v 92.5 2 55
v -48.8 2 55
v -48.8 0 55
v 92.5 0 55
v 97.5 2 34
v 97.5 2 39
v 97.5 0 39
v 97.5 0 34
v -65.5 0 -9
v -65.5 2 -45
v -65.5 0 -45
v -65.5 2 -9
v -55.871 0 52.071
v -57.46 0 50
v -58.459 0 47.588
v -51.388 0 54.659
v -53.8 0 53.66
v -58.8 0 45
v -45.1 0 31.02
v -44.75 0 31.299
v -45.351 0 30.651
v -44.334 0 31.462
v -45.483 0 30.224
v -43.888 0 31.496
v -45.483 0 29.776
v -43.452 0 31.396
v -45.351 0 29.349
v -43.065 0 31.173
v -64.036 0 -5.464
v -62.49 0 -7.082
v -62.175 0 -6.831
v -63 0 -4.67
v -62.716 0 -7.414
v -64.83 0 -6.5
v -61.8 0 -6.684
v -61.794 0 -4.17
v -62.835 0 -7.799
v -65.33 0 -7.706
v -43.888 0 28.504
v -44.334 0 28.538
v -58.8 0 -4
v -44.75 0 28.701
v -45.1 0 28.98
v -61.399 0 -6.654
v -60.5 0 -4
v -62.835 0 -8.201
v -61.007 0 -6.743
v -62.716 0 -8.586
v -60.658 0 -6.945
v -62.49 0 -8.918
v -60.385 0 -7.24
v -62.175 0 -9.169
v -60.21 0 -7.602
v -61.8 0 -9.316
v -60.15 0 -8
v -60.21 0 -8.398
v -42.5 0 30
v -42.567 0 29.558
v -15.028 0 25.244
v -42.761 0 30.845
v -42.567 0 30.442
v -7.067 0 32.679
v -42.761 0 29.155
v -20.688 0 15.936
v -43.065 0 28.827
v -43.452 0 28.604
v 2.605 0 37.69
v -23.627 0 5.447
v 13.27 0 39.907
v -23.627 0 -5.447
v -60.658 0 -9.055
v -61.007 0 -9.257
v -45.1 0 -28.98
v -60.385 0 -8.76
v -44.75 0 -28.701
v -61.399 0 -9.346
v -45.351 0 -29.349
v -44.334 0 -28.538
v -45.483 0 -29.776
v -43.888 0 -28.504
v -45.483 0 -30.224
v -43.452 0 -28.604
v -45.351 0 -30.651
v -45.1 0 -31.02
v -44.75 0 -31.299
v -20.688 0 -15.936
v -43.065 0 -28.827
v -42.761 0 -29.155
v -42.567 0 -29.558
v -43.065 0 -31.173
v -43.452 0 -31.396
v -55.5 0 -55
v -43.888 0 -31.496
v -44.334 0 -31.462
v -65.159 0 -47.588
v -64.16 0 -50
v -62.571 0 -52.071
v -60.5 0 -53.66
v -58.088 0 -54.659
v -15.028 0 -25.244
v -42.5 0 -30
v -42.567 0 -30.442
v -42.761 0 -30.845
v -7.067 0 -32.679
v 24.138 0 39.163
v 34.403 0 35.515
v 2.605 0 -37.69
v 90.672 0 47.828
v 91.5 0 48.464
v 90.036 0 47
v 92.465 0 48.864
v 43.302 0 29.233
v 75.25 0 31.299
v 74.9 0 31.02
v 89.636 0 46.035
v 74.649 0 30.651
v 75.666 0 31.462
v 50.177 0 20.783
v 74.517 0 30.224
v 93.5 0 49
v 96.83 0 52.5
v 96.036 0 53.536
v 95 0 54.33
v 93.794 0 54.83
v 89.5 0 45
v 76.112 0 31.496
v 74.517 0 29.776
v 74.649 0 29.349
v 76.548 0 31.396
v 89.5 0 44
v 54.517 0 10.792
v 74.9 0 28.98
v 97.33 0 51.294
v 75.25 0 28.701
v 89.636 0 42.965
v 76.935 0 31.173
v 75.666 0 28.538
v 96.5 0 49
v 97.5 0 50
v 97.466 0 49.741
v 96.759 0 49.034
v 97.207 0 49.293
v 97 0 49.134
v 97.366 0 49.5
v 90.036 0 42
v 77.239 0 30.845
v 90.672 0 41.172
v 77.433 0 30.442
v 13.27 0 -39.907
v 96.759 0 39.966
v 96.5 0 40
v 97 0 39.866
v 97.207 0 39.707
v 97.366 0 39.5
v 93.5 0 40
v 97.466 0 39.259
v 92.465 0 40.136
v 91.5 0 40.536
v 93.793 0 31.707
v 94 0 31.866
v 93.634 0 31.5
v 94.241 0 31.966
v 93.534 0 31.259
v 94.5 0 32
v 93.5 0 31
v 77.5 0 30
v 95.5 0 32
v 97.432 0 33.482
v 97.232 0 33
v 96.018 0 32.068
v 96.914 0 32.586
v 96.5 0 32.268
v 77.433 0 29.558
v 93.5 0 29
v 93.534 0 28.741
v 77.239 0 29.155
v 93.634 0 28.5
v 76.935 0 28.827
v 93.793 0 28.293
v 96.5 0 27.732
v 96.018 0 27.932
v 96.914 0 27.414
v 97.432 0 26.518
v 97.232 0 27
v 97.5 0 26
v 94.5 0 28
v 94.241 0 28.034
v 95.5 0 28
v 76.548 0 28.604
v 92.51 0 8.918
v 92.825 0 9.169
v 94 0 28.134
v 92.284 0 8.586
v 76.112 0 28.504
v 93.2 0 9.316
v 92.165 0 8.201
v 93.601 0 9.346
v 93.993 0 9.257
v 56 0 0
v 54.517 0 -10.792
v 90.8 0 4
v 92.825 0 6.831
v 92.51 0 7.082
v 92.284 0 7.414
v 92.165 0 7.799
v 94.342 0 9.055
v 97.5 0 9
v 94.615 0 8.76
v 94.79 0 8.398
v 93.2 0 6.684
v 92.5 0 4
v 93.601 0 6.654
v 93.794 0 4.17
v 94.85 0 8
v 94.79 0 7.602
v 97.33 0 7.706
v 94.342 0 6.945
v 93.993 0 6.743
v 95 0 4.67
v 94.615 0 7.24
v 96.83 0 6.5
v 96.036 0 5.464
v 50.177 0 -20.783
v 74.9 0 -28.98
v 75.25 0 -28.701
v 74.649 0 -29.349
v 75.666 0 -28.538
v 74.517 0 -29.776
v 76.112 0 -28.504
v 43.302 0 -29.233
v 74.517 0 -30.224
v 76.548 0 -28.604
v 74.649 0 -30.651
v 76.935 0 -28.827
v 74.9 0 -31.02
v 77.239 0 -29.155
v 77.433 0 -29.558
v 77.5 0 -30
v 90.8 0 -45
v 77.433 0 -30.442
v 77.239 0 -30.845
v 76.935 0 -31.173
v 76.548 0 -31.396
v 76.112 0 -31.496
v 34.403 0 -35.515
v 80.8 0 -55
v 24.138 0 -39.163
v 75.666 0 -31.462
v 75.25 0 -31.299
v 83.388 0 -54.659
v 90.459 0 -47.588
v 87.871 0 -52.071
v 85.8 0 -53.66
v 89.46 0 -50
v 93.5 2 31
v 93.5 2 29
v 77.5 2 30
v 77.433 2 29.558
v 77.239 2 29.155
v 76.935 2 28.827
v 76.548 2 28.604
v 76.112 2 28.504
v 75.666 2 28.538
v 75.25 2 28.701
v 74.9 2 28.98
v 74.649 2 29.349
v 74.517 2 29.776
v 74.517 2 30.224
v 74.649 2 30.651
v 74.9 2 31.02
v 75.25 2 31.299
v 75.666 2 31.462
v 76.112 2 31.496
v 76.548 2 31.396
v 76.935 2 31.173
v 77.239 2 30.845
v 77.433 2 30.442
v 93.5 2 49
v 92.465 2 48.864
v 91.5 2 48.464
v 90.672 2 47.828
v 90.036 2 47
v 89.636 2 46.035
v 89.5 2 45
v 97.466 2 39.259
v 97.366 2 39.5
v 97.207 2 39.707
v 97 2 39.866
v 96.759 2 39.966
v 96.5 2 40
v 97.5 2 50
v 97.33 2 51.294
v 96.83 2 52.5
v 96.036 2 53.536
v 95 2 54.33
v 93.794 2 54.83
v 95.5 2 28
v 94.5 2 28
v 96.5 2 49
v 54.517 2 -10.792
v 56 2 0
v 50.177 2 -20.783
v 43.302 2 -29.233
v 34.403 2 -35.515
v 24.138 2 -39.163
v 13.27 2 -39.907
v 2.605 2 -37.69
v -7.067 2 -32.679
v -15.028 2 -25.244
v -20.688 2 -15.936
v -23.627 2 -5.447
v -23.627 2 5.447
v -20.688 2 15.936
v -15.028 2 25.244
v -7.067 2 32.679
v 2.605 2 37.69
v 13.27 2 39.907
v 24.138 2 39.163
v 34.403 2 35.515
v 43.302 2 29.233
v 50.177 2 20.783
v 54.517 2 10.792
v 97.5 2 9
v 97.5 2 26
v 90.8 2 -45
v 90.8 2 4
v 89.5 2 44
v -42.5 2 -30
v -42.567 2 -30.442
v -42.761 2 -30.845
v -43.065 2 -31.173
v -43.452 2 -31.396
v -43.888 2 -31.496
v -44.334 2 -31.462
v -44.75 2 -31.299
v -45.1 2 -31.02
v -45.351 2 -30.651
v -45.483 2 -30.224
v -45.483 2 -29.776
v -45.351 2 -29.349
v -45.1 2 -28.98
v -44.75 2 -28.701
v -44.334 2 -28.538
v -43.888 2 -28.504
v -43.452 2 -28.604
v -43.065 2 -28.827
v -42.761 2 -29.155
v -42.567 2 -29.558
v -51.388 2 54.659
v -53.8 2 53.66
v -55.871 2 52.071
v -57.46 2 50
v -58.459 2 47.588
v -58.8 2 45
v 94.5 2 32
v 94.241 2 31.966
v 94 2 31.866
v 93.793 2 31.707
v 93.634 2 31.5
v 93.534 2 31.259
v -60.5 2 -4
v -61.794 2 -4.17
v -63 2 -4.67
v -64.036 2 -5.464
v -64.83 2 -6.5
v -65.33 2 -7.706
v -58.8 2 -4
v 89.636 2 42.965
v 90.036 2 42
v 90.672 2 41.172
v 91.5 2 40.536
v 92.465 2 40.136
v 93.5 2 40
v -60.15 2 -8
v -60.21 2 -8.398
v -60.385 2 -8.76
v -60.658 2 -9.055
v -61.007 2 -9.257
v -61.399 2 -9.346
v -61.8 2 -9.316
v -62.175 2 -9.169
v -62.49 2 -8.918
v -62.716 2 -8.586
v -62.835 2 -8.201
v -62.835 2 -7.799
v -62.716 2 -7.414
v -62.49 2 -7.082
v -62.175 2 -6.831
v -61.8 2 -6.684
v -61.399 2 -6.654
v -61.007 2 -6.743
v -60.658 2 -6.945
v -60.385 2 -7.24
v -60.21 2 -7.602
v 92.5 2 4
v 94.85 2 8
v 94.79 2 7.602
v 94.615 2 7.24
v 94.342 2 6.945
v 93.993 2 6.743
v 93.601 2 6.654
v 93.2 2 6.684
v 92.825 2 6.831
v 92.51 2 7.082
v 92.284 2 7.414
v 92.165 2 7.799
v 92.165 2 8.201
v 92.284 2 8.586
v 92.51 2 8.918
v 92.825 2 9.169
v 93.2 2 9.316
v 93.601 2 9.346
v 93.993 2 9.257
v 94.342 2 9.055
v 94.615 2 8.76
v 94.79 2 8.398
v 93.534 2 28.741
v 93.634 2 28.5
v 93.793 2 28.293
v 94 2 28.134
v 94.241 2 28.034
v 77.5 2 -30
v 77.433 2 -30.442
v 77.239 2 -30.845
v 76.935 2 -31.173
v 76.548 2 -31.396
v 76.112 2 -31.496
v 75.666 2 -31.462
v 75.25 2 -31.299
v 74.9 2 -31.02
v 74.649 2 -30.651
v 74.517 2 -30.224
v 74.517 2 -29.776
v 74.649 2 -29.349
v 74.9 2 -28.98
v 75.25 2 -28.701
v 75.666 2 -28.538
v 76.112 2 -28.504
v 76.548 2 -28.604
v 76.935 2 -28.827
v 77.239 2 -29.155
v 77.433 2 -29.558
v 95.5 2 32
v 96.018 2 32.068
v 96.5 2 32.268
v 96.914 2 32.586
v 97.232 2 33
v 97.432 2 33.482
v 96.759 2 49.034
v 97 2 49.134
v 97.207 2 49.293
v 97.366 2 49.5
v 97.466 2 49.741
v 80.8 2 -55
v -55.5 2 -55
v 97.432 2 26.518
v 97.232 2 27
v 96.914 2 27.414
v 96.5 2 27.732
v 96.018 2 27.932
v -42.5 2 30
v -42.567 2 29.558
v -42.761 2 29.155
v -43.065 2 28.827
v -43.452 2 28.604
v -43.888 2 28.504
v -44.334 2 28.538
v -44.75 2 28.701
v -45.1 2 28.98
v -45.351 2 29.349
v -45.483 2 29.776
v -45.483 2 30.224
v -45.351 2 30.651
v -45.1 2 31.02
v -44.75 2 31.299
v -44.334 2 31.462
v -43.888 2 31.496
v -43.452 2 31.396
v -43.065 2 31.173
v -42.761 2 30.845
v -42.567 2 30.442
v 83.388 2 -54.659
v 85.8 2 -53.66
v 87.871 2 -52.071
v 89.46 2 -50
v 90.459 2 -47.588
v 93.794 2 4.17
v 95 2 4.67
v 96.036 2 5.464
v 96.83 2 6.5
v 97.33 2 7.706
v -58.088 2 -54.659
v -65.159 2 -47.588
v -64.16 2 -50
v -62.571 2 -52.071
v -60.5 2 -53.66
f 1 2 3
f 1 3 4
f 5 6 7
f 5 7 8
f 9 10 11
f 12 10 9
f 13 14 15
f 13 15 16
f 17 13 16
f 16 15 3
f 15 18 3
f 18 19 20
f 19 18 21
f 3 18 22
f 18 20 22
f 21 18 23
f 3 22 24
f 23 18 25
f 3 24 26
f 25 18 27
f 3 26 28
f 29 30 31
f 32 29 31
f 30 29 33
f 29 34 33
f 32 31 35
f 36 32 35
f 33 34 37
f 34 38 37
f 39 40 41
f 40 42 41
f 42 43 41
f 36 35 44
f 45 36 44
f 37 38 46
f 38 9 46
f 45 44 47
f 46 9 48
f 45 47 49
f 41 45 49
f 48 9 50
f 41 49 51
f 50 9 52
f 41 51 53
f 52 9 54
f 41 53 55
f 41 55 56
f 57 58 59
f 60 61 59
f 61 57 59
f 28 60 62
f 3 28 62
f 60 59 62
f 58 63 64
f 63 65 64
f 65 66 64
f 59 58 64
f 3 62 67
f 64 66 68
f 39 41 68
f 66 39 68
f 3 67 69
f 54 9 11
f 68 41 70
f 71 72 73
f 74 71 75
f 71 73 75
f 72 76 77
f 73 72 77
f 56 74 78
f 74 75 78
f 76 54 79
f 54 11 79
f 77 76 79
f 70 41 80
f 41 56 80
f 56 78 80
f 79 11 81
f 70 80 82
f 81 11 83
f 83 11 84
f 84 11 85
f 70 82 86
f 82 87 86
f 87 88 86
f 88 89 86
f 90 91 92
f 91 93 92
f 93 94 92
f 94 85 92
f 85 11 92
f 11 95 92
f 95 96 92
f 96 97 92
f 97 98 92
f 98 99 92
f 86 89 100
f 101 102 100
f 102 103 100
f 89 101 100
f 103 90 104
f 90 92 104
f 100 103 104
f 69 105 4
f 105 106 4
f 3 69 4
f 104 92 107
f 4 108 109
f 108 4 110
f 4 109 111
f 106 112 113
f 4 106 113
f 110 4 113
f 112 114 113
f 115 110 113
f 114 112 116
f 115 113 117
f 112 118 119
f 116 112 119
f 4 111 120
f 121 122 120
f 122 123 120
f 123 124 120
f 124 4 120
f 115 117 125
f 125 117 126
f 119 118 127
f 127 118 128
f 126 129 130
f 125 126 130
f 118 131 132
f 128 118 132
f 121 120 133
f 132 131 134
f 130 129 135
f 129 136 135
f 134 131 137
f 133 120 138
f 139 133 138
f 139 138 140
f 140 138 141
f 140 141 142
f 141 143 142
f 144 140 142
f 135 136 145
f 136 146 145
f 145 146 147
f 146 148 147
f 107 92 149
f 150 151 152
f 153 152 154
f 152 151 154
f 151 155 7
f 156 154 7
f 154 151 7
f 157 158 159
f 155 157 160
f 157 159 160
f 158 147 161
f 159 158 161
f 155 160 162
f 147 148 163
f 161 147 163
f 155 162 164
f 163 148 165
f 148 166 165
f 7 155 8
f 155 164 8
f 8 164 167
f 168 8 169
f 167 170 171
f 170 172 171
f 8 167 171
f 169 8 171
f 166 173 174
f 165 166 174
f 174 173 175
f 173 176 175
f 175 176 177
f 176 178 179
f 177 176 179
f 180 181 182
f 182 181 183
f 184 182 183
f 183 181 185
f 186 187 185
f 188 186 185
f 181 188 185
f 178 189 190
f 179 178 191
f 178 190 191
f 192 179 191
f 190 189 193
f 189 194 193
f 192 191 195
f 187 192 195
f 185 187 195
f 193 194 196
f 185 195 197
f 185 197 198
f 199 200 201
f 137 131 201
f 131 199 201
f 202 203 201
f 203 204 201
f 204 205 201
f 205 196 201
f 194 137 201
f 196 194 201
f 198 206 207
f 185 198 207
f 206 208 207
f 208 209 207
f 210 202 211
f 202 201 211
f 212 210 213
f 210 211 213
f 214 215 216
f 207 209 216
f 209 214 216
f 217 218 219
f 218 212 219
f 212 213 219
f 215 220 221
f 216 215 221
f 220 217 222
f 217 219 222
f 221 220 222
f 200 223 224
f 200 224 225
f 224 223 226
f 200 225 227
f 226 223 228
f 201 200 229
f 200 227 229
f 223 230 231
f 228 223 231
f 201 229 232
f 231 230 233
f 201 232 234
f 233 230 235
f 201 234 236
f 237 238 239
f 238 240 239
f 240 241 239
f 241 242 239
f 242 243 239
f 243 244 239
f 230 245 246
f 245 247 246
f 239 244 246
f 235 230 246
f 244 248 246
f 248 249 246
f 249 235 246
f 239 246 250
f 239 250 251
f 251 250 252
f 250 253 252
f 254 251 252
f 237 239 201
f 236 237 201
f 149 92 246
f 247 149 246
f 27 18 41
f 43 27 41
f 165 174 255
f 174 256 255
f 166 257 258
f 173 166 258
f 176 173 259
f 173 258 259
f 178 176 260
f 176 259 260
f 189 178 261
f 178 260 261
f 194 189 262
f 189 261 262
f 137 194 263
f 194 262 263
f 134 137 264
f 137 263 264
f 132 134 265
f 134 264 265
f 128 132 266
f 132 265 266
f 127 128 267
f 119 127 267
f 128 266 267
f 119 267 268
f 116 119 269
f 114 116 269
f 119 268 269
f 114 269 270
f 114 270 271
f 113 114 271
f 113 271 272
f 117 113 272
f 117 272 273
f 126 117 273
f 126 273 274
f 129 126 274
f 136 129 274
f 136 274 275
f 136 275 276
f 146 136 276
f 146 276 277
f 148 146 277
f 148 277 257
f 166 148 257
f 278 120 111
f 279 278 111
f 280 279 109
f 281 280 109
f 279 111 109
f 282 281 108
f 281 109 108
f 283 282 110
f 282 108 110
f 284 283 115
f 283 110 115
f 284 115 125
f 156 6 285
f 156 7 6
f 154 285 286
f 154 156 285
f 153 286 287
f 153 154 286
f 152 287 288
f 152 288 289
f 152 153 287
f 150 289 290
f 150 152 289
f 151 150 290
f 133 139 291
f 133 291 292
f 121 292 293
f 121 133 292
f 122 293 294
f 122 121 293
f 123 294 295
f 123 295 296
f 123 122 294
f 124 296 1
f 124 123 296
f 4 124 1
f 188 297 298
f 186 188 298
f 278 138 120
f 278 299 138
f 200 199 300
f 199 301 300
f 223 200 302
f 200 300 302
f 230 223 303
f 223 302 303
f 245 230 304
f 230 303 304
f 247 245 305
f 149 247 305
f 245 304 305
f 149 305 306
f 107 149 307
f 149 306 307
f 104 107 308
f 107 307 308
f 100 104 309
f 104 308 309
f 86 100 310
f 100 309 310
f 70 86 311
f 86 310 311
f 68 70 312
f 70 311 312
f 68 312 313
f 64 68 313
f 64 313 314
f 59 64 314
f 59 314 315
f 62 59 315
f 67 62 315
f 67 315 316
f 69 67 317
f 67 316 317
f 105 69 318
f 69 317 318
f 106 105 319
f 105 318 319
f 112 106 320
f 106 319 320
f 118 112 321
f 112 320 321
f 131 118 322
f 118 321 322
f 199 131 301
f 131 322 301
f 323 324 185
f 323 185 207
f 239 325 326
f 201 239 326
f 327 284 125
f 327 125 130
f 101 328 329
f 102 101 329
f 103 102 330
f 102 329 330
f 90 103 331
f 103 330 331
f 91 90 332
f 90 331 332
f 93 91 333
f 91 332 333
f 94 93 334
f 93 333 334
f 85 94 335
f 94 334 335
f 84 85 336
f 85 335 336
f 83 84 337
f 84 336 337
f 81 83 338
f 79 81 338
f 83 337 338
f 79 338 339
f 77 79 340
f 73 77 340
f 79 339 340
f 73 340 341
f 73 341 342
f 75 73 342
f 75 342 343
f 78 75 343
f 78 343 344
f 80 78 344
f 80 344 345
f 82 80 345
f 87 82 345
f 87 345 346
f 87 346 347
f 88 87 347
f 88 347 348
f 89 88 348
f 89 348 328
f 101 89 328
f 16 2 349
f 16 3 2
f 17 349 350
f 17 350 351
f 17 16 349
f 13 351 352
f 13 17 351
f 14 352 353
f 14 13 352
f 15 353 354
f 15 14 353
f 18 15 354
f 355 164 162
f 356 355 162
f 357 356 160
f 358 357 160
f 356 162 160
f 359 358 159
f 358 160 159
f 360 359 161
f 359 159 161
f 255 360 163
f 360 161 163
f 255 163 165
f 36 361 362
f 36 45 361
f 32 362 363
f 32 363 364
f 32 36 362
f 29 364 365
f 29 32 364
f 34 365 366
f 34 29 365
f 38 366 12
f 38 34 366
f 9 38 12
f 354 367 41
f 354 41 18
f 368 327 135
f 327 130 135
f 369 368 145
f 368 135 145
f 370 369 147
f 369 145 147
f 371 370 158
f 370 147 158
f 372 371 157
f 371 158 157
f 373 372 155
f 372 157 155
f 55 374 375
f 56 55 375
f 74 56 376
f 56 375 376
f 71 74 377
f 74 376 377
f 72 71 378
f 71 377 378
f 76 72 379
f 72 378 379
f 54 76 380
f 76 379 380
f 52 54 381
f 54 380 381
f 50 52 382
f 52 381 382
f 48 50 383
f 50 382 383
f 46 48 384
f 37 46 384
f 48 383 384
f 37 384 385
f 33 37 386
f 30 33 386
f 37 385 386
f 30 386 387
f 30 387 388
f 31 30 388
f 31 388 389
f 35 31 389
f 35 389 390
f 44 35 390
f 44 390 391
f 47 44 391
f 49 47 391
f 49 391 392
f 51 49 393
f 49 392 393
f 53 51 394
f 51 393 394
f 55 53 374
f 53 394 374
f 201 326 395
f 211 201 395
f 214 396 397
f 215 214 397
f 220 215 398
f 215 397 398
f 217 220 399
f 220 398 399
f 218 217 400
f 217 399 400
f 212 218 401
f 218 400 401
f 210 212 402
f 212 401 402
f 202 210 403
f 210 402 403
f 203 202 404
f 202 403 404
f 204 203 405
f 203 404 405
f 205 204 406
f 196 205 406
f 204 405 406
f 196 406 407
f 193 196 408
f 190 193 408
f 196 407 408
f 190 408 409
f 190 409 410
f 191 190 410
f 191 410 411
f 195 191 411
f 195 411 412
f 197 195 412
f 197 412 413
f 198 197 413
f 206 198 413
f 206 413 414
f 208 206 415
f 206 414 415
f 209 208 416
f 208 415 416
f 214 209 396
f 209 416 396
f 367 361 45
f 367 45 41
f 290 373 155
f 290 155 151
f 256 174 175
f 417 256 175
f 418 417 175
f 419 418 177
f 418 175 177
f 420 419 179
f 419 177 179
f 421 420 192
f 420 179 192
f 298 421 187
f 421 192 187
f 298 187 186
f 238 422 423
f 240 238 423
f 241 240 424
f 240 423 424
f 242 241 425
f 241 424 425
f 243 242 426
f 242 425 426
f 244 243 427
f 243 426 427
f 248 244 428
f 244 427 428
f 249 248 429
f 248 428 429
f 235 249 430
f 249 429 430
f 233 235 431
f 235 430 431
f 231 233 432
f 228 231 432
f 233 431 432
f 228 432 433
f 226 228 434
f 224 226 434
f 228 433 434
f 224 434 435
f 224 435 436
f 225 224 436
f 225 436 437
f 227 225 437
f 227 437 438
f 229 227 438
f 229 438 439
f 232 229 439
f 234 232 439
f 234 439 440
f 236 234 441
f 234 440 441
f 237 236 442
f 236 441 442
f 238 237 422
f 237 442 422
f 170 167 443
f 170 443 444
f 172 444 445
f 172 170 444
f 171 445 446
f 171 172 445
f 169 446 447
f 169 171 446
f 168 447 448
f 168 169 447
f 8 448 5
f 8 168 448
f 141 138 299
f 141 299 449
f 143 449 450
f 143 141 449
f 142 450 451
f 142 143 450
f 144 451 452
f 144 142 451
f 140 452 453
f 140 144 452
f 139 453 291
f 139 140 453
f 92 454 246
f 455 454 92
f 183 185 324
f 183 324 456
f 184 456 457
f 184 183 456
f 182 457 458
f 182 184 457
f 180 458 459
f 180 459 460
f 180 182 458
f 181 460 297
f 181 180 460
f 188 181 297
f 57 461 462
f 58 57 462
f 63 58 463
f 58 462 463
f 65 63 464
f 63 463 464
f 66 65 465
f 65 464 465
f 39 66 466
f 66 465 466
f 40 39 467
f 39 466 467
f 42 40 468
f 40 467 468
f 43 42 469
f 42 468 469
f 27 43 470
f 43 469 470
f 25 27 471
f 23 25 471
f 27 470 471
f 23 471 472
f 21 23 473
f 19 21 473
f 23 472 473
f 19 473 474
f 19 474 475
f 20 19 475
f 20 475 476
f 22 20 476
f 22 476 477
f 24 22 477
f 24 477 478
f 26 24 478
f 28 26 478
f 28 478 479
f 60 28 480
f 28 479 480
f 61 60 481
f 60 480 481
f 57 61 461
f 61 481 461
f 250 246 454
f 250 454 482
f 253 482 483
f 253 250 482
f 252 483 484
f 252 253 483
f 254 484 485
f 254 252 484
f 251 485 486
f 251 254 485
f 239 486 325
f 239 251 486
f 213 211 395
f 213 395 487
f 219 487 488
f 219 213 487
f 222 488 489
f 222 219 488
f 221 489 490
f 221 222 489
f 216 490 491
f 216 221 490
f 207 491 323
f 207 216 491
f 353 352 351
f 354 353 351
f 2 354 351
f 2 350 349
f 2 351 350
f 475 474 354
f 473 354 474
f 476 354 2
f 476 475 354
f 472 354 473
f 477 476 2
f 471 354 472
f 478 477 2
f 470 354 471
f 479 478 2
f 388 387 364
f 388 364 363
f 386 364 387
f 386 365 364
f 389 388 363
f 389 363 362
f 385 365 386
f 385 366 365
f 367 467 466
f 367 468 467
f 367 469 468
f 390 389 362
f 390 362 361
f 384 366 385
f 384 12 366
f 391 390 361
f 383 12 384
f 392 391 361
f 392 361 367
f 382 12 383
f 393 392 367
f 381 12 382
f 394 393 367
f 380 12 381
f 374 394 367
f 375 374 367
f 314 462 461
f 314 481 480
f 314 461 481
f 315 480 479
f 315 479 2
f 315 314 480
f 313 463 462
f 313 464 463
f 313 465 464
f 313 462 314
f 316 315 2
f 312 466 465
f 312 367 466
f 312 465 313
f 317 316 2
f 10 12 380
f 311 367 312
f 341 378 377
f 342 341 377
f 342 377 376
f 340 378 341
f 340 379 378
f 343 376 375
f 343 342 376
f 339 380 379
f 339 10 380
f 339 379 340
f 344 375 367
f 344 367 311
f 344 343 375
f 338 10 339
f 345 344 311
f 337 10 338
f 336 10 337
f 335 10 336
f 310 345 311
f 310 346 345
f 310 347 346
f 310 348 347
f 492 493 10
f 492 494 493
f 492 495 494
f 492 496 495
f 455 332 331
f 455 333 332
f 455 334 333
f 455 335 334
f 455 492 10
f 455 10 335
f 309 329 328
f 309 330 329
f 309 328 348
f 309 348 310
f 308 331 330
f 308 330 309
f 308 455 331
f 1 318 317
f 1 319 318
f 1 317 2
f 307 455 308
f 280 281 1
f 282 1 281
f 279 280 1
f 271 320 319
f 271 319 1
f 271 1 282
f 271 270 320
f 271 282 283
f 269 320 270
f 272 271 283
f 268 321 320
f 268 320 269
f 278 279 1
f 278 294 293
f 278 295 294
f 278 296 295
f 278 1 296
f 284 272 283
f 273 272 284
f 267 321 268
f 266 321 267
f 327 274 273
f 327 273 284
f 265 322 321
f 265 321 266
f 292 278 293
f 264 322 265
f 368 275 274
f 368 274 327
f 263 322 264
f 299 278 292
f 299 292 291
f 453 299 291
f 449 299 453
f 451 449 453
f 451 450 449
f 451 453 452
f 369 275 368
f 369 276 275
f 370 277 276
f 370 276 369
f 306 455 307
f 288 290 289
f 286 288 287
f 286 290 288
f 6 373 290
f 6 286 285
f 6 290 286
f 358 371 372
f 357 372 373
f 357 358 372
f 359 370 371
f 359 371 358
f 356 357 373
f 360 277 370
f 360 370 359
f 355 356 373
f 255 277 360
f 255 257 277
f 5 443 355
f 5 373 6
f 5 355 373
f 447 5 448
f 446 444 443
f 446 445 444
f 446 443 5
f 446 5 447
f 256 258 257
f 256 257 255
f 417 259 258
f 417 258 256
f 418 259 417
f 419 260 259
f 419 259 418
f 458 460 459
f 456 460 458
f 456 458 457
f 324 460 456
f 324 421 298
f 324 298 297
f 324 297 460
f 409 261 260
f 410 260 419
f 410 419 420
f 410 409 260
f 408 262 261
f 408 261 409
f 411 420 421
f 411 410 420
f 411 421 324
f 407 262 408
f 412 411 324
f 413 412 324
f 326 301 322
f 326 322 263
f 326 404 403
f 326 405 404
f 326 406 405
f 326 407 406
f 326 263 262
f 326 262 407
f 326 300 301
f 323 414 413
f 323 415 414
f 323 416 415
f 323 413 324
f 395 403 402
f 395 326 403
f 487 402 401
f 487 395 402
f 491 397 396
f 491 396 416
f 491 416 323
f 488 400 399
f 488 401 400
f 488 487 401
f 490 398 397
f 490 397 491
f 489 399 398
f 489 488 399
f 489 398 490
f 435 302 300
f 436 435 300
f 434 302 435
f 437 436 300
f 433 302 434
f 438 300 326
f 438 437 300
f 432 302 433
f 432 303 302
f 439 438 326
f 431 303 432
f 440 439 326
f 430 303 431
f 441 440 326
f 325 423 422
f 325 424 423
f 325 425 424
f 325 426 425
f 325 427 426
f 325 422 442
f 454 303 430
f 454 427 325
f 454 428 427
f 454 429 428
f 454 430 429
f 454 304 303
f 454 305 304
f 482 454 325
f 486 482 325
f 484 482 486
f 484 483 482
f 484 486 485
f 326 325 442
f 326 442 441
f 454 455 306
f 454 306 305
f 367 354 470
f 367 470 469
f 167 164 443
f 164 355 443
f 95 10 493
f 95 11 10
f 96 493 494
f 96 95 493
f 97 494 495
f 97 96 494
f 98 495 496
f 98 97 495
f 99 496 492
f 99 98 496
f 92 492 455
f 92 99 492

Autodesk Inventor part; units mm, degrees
ref_plane "YZ Plane" through (0, 0, 0) normal (1, 0, 0) x (0, 1, 0)
ref_plane "XZ Plane" through (0, 0, 0) normal (0, 1, 0) x (-1, 0, 0)
ref_plane "XY Plane" through (0, 0, 0) normal (0, 0, 1) x (1, 0, 0)
sketch "Sketch1" plane through (0, 0, 0) normal (0, 1, 0) x (-1, 0, 0)
  circle A0 centre (0, 0) radius 40
  circle A1 centre (0, 0) radius 25
  dimension "d1" = 50
  dimension "d13" = 15
extrude "Extrusion1" add sketch "Sketch1" along normal blind 5
sketch "Sketch2" plane through (0, 5, 0) normal (0, 1, 0) x (1, 0, 0)
  circle A0 centre (-33, 0) radius 1.25
  circle A1 centre (0, 0) radius 25 projected
  circle A2 centre (0, 0) radius 33 construction
  dimension "d4" = 2.5
  dimension "d12" = 8
extrude "Extrusion2" cut sketch "Sketch2" against normal blind 10 contours A0
pattern_circular "Circular Pattern1" count 6 over 360 about axis through (0, 0, 0) along (0, 1, 0) of "Extrusion2"
sketch "Sketch3" plane through (0, 5, 0) normal (0, 1, 0) x (1, 0, 0)
  line L0 (-85, -42.5) -> (85, -42.5)
  line L1 (85, -42.5) -> (85, 42.5)
  line L2 (85, 42.5) -> (-85, 42.5)
  line L3 (-85, 42.5) -> (-85, -42.5)
  line L4 (-85, -42.5) -> (85, 42.5) construction
  line L5 (85, -42.5) -> (-85, 42.5) construction
  line L6 (34.5, 15.5) -> (65.5, 15.5) construction
  line L7 (65.5, 15.5) -> (65.5, -15.5) construction
  line L8 (65.5, -15.5) -> (34.5, -15.5) construction
  line L9 (34.5, -15.5) -> (34.5, 15.5) construction
  line L10 (34.5, 15.5) -> (65.5, -15.5) construction
  line L11 (65.5, 15.5) -> (34.5, -15.5) construction
  circle A0 centre (34.5, 15.5) radius 1.5
  circle A1 centre (65.5, 15.5) radius 1.5
  circle A2 centre (65.5, -15.5) radius 1.5
  circle A3 centre (34.5, -15.5) radius 1.5
  line L12 (0, 0) -> (50, 0) construction
  circle A4 centre (0, 0) radius 40
  circle A5 centre (0, 0) radius 40 projected
  line L13 (-50, 42.5) -> (-50, -42.5)
  circle A6 centre (50, 0) radius 12
  dimension "d14" = 85
  dimension "d15" = 170
  dimension "d16" = 31
  dimension "d17" = 31
  dimension "d18" = 3
  dimension "d19" = 3
  dimension "d20" = 3
  dimension "d21" = 3
  dimension "d22" = 50
  dimension "d23" = 35
  dimension "d26" = 24
extrude "Extrusion3" add sketch "Sketch3" against normal blind 5 contours L13 L2 L1 L0
sketch "Sketch4" plane through (0, 5, 0) normal (0, 1, 0) x (1, 0, 0)
  arc A0 (39.56, -5.9166) -> (39.56, 5.9166) centre (50, 0) ccw projected
  circle A1 centre (50, 0) radius 12
  point P0 (0, 0)
  point P1 (39.56, 5.9166)
  point P2 (39.56, -5.9166)
extrude "Extrusion4" cut sketch "Sketch4" against normal blind 5
sketch "Sketch5" plane through (0, 5, 0) normal (0, 1, 0) x (1, 0, 0)
  circle A0 centre (65.5, 15.5) radius 1.5 projected
  circle A1 centre (65.5, 15.5) radius 1.5
  line L0 (34.5, -15.5) -> (65.5, -15.5)
  line L1 (65.5, -15.5) -> (65.5, 15.5)
  line L2 (65.5, 15.5) -> (34.5, 15.5)
  line L3 (34.5, 15.5) -> (34.5, -15.5)
  circle A2 centre (50, 0) radius 12 projected
  line L4 (34.5, -15.5) -> (65.5, 15.5) construction
  line L5 (65.5, -15.5) -> (34.5, 15.5) construction
  circle A3 centre (34.5, 15.5) radius 1.5
  circle A4 centre (34.5, -15.5) radius 1.5
  point P0 (0, 0)
  dimension "d30" = 3
  dimension "d31" = 3
extrude "Extrusion5" cut sketch "Sketch5" against normal blind 5 contours A3 L3 L2 | L2 L3 A3 | A4 L3 L0 | L0 L3 A4
sketch "Sketch6" plane through (0, 5, 0) normal (0, 1, 0) x (1, 0, 0)
  line L0 (-65.5, -55) -> (97.5, -55)
  line L1 (97.5, -55) -> (97.5, 55)
  line L2 (97.5, 55) -> (-65.5, 55)
  line L3 (-65.5, 55) -> (-65.5, -55)
  line L4 (-65.5, -55) -> (97.5, 55) construction
  line L5 (97.5, -55) -> (-65.5, 55) construction
  line L6 (-65.5, 4) -> (-58.8, 4)
  line L7 (-58.8, 4) -> (-58.8, -55)
  line L8 (-58.8, -55) -> (-65.5, -55)
  line L9 (-65.5, -55) -> (-65.5, 4)
  line L10 (97.5, 55) -> (90.8, 55)
  line L11 (90.8, 55) -> (90.8, -4)
  line L12 (90.8, -4) -> (97.5, -4)
  line L13 (97.5, -4) -> (97.5, 55)
  line L14 (-50, -42.5) -> (-50, 42.5) projected
  line L15 (85, 42.5) -> (85, -42.5) projected
  line L16 (-50, 42.5) -> (85, 42.5)
  line L17 (85, 42.5) -> (85, -42.5)
  line L18 (85, -42.5) -> (-50, -42.5)
  line L19 (-50, -42.5) -> (-50, 42.5)
  point P0 (0, 0)
  point P1 (16, 0)
  dimension "d34" = 16
  dimension "d35" = 110
  dimension "d36" = 163
  dimension "d37" = 6.7
  dimension "d38" = 6.7
  dimension "d40" = 51
  dimension "d41" = 51
extrude "Extrusion6" add sketch "Sketch6" against normal blind 5 contours L7 L6 L3 L2 L11 L12 L1 L0
sketch "Sketch7" plane through (0, 5, 0) normal (0, 1, 0) x (1, 0, 0)
  line L0 (97.5, -49) -> (89.5, -49)
  line L1 (89.5, -49) -> (89.5, -40)
  line L2 (89.5, -40) -> (97.5, -40)
  line L3 (97.5, -40) -> (97.5, -49)
  line L4 (-58.8, -55) -> (97.5, -55) projected
  line L5 (97.5, -55) -> (97.5, -4) projected
  line L6 (97.5, -28) -> (93.5, -28)
  line L7 (93.5, -28) -> (93.5, -32)
  line L8 (93.5, -32) -> (97.5, -32)
  line L9 (97.5, -32) -> (97.5, -28)
  point P0 (0, 0)
  dimension "d44" = 6
  dimension "d45" = 9
  dimension "d46" = 8
  dimension "d47" = 8
  dimension "d48" = 4
  dimension "d49" = 4
extrude "Extrusion7" cut sketch "Sketch7" against normal blind 5
fillet "Fillet2" radius 2 2 edges at (97.5, 2.5, 28) (97.5, 2.5, 32)
fillet "Fillet3" radius 1 2 edges at (93.5, 2.5, 28) (93.5, 2.5, 32)
fillet "Fillet4" radius 1 2 edges at (97.5, 2.5, 49) (97.5, 2.5, 40)
fillet "Fillet5" radius 5 1 edges at (97.5, 2.5, 55)
fillet "Fillet6" radius 4 2 edges at (89.5, 2.5, 40) (89.5, 2.5, 49)
fillet "Fillet7" radius 5 2 edges at (97.5, 2.5, 4) (-65.5, 2.5, -4)
fillet "Fillet8" radius 10 3 edges at (-58.8, 2.5, 55) (90.8, 2.5, -55) (-65.5, 2.5, -55)
sketch "Sketch8" plane through (0, 5, 0) normal (0, 1, 0) x (1, 0, 0)
  circle A0 centre (-61.5, 8) radius 1.35
  circle A1 centre (93.5, -8) radius 1.35
  line L0 (-60.5, 4) -> (-58.8, 4) projected
  line L1 (-65.5, 45) -> (-65.5, 9) projected
  line L2 (92.5, -4) -> (90.8, -4) projected
  line L3 (97.5, -26) -> (97.5, -9) projected
  point P0 (0, 0)
  dimension "d59" = 4
  dimension "d60" = 4
  dimension "d61" = 2.7
  dimension "d62" = 4
  dimension "d63" = 4
  dimension "d64" = 2.7
extrude "Extrusion8" cut sketch "Sketch8" against normal blind 5
sketch "Sketch9" plane through (0, 5, 0) normal (0, 1, 0) x (1, 0, 0)
  line L0 (-48, 44) -> (76, 44)
  line L1 (76, 44) -> (76, -39)
  line L2 (76, -39) -> (-48, -39)
  line L3 (-48, -39) -> (-48, 44)
  point P0 (0, 0)
extrude "Extrusion9" add sketch "Sketch9" against normal blind 5
sketch "Sketch10" plane through (0, 5, 0) normal (0, 1, 0) x (1, 0, 0)
  circle A0 centre (16, 0) radius 40
  line L0 (-58.8, 4) -> (-58.8, -45) projected
  point P0 (0, 0)
  dimension "d69" = 80
  dimension "d70" = 74.8
extrude "Extrusion10" cut sketch "Sketch10" against normal blind 5
sketch "Sketch11" plane through (0, 5, 0) normal (0, 1, 0) x (1, 0, 0)
  line L0 (-44, -30) -> (76, -30) construction
  line L1 (76, -30) -> (76, 30) construction
  line L2 (76, 30) -> (-44, 30) construction
  line L3 (-44, 30) -> (-44, -30) construction
  circle A0 centre (16, 0) radius 40 construction
  line L4 (-44, -30) -> (76, 30) construction
  line L5 (76, -30) -> (-44, 30) construction
  circle A1 centre (76, 30) radius 1.5
  circle A2 centre (-44, 30) radius 1.5
  circle A3 centre (-44, -30) radius 1.5
  circle A4 centre (76, -30) radius 1.5
  point P0 (0, 0)
  dimension "d73" = 60
  dimension "d74" = 120
  dimension "d75" = 3
  dimension "d76" = 3
  dimension "d77" = 3
  dimension "d78" = 3
extrude "Extrusion11" cut sketch "Sketch11" against normal blind 5
sketch "Sketch12" plane through (0, 5, 0) normal (0, 1, 0) x (1, 0, 0)
  line L0 (-160, 70) -> (160, 70)
  line L1 (160, 70) -> (160, -70)
  line L2 (160, -70) -> (-160, -70)
  line L3 (-160, -70) -> (-160, 70)
  line L4 (-160, 70) -> (160, -70) construction
  line L5 (160, 70) -> (-160, -70) construction
  point P0 (0, 0)
extrude "Extrusion12" cut sketch "Sketch12" against normal blind 3
properties part number "Microscope lid"
